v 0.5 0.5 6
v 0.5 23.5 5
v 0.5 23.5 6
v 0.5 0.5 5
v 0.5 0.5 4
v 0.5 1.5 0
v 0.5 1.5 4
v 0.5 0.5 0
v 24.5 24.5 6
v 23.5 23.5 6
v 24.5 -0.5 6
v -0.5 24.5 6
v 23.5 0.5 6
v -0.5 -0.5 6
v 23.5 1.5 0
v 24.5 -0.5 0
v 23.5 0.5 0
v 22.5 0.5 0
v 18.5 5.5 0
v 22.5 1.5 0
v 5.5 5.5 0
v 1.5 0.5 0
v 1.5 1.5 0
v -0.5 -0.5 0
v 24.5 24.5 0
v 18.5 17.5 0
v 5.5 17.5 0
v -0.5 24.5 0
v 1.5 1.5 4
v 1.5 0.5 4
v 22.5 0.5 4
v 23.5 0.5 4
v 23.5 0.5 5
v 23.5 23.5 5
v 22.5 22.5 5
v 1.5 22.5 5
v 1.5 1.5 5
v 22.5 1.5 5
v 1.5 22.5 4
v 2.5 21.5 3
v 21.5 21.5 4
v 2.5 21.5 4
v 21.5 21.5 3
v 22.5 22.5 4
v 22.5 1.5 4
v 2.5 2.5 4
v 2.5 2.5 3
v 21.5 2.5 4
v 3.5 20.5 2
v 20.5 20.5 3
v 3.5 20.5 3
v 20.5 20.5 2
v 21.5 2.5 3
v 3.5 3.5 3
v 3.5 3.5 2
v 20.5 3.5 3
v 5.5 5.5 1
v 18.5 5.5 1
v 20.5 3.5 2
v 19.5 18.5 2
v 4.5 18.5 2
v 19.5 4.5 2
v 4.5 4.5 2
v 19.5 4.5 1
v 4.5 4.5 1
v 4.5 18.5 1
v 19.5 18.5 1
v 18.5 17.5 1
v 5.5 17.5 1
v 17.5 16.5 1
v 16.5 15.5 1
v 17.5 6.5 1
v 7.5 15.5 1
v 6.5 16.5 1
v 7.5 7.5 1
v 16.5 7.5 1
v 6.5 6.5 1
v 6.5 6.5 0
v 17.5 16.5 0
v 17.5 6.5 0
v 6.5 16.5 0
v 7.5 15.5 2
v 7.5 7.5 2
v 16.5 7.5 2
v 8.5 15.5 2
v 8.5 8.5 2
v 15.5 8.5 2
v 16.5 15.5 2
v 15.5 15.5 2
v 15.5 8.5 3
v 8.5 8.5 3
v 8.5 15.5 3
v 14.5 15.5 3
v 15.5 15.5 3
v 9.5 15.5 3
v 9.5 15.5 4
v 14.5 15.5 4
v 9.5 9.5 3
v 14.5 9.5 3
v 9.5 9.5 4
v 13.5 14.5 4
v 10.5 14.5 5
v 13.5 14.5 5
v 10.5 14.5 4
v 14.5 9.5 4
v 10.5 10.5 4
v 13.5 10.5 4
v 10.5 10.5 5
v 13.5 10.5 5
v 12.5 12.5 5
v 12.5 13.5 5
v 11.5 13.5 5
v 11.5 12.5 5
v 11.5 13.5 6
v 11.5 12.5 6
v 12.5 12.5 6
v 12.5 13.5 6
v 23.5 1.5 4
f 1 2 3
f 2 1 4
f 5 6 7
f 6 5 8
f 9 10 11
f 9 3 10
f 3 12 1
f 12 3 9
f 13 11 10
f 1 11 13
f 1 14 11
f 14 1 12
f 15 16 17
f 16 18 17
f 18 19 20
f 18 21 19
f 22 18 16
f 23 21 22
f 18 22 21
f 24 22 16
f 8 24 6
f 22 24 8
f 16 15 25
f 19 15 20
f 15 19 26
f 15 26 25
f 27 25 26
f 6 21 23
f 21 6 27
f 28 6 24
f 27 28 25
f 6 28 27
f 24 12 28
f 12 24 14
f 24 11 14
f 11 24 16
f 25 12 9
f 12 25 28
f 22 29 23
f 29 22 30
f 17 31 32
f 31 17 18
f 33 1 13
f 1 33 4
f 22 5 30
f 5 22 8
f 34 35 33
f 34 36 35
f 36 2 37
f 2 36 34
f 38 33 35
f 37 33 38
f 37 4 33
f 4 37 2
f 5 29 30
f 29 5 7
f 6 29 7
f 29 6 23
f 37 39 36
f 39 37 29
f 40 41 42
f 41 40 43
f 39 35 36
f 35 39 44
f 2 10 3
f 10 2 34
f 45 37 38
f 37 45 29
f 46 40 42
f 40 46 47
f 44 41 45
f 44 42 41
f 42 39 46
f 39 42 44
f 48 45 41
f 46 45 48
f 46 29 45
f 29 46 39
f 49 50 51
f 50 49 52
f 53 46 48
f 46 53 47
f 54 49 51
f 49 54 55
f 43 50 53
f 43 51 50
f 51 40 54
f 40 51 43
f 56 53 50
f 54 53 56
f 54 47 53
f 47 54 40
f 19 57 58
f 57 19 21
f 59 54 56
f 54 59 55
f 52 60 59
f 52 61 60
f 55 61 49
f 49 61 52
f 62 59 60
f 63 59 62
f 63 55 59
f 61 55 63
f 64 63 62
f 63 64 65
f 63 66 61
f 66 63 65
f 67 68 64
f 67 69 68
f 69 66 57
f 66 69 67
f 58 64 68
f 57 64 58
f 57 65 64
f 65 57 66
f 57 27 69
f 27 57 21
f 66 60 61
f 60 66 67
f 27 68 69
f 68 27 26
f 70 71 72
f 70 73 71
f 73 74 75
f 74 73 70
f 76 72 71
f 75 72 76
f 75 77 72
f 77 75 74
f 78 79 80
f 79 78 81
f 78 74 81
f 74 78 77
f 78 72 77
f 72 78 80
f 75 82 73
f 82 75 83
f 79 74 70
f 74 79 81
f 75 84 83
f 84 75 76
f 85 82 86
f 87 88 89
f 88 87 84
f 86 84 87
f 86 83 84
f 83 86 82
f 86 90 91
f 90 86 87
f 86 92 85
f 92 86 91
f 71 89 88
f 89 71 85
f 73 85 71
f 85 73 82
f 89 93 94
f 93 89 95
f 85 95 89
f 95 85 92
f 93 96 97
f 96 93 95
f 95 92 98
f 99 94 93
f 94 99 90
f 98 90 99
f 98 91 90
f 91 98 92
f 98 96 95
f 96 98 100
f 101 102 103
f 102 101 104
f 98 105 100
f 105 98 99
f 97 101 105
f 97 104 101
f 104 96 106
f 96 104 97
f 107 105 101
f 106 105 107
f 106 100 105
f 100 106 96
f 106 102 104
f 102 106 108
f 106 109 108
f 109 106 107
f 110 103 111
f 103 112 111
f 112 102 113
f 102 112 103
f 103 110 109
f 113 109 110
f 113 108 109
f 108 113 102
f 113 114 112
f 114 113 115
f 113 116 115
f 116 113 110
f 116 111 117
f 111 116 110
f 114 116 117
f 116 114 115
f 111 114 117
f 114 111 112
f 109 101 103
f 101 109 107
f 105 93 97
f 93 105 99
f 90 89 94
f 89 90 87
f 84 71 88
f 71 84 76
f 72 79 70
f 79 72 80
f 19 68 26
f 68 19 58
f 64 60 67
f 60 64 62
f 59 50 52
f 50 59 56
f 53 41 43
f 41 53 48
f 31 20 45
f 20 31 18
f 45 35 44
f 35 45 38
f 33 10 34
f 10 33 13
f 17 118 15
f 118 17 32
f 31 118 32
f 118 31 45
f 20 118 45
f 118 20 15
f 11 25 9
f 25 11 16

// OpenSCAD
union() {
    translate([0, 0, 3.0]) cube([1, 1, 6], center=true);
    translate([0, 1, 3.0]) cube([1, 1, 6], center=true);
    translate([0, 2, 3.0]) cube([1, 1, 6], center=true);
    translate([0, 3, 3.0]) cube([1, 1, 6], center=true);
    translate([0, 4, 3.0]) cube([1, 1, 6], center=true);
    translate([0, 5, 3.0]) cube([1, 1, 6], center=true);
    translate([0, 6, 3.0]) cube([1, 1, 6], center=true);
    translate([0, 7, 3.0]) cube([1, 1, 6], center=true);
    translate([0, 8, 3.0]) cube([1, 1, 6], center=true);
    translate([0, 9, 3.0]) cube([1, 1, 6], center=true);
    translate([0, 10, 3.0]) cube([1, 1, 6], center=true);
    translate([0, 11, 3.0]) cube([1, 1, 6], center=true);
    translate([0, 12, 3.0]) cube([1, 1, 6], center=true);
    translate([0, 13, 3.0]) cube([1, 1, 6], center=true);
    translate([0, 14, 3.0]) cube([1, 1, 6], center=true);
    translate([0, 15, 3.0]) cube([1, 1, 6], center=true);
    translate([0, 16, 3.0]) cube([1, 1, 6], center=true);
    translate([0, 17, 3.0]) cube([1, 1, 6], center=true);
    translate([0, 18, 3.0]) cube([1, 1, 6], center=true);
    translate([0, 19, 3.0]) cube([1, 1, 6], center=true);
    translate([0, 20, 3.0]) cube([1, 1, 6], center=true);
    translate([0, 21, 3.0]) cube([1, 1, 6], center=true);
    translate([0, 22, 3.0]) cube([1, 1, 6], center=true);
    translate([0, 23, 3.0]) cube([1, 1, 6], center=true);
    translate([0, 24, 3.0]) cube([1, 1, 6], center=true);
    translate([1, 0, 3.0]) cube([1, 1, 6], center=true);
    translate([1, 1, 4.5]) color([1, 0, 0]) cube([1, 1, 1], center=true);
    translate([1, 2, 2.5]) cube([1, 1, 5], center=true);
    translate([1, 3, 2.5]) cube([1, 1, 5], center=true);
    translate([1, 4, 2.5]) cube([1, 1, 5], center=true);
    translate([1, 5, 2.5]) cube([1, 1, 5], center=true);
    translate([1, 6, 2.5]) cube([1, 1, 5], center=true);
    translate([1, 7, 2.5]) cube([1, 1, 5], center=true);
    translate([1, 8, 2.5]) cube([1, 1, 5], center=true);
    translate([1, 9, 2.5]) cube([1, 1, 5], center=true);
    translate([1, 10, 2.5]) cube([1, 1, 5], center=true);
    translate([1, 11, 2.5]) cube([1, 1, 5], center=true);
    translate([1, 12, 2.5]) cube([1, 1, 5], center=true);
    translate([1, 13, 2.5]) cube([1, 1, 5], center=true);
    translate([1, 14, 2.5]) cube([1, 1, 5], center=true);
    translate([1, 15, 2.5]) cube([1, 1, 5], center=true);
    translate([1, 16, 2.5]) cube([1, 1, 5], center=true);
    translate([1, 17, 2.5]) cube([1, 1, 5], center=true);
    translate([1, 18, 2.5]) cube([1, 1, 5], center=true);
    translate([1, 19, 2.5]) cube([1, 1, 5], center=true);
    translate([1, 20, 2.5]) cube([1, 1, 5], center=true);
    translate([1, 21, 2.5]) cube([1, 1, 5], center=true);
    translate([1, 22, 2.5]) cube([1, 1, 5], center=true);
    translate([1, 23, 2.5]) cube([1, 1, 5], center=true);
    translate([1, 24, 3.0]) cube([1, 1, 6], center=true);
    translate([2, 0, 3.0]) cube([1, 1, 6], center=true);
    translate([2, 1, 2.5]) cube([1, 1, 5], center=true);
    translate([2, 2, 2.0]) cube([1, 1, 4], center=true);
    translate([2, 3, 2.0]) cube([1, 1, 4], center=true);
    translate([2, 4, 2.0]) cube([1, 1, 4], center=true);
    translate([2, 5, 2.0]) cube([1, 1, 4], center=true);
    translate([2, 6, 2.0]) cube([1, 1, 4], center=true);
    translate([2, 7, 2.0]) cube([1, 1, 4], center=true);
    translate([2, 8, 2.0]) cube([1, 1, 4], center=true);
    translate([2, 9, 2.0]) cube([1, 1, 4], center=true);
    translate([2, 10, 2.0]) cube([1, 1, 4], center=true);
    translate([2, 11, 2.0]) cube([1, 1, 4], center=true);
    translate([2, 12, 2.0]) cube([1, 1, 4], center=true);
    translate([2, 13, 2.0]) cube([1, 1, 4], center=true);
    translate([2, 14, 2.0]) cube([1, 1, 4], center=true);
    translate([2, 15, 2.0]) cube([1, 1, 4], center=true);
    translate([2, 16, 2.0]) cube([1, 1, 4], center=true);
    translate([2, 17, 2.0]) cube([1, 1, 4], center=true);
    translate([2, 18, 2.0]) cube([1, 1, 4], center=true);
    translate([2, 19, 2.0]) cube([1, 1, 4], center=true);
    translate([2, 20, 2.0]) cube([1, 1, 4], center=true);
    translate([2, 21, 2.0]) cube([1, 1, 4], center=true);
    translate([2, 22, 2.0]) cube([1, 1, 4], center=true);
    translate([2, 23, 2.5]) cube([1, 1, 5], center=true);
    translate([2, 24, 3.0]) cube([1, 1, 6], center=true);
    translate([3, 0, 3.0]) cube([1, 1, 6], center=true);
    translate([3, 1, 2.5]) cube([1, 1, 5], center=true);
    translate([3, 2, 2.0]) cube([1, 1, 4], center=true);
    translate([3, 3, 1.5]) cube([1, 1, 3], center=true);
    translate([3, 4, 1.5]) cube([1, 1, 3], center=true);
    translate([3, 5, 1.5]) cube([1, 1, 3], center=true);
    translate([3, 6, 1.5]) cube([1, 1, 3], center=true);
    translate([3, 7, 1.5]) cube([1, 1, 3], center=true);
    translate([3, 8, 1.5]) cube([1, 1, 3], center=true);
    translate([3, 9, 1.5]) cube([1, 1, 3], center=true);
    translate([3, 10, 1.5]) cube([1, 1, 3], center=true);
    translate([3, 11, 1.5]) cube([1, 1, 3], center=true);
    translate([3, 12, 1.5]) cube([1, 1, 3], center=true);
    translate([3, 13, 1.5]) cube([1, 1, 3], center=true);
    translate([3, 14, 1.5]) cube([1, 1, 3], center=true);
    translate([3, 15, 1.5]) cube([1, 1, 3], center=true);
    translate([3, 16, 1.5]) cube([1, 1, 3], center=true);
    translate([3, 17, 1.5]) cube([1, 1, 3], center=true);
    translate([3, 18, 1.5]) cube([1, 1, 3], center=true);
    translate([3, 19, 1.5]) cube([1, 1, 3], center=true);
    translate([3, 20, 1.5]) cube([1, 1, 3], center=true);
    translate([3, 21, 1.5]) cube([1, 1, 3], center=true);
    translate([3, 22, 2.0]) cube([1, 1, 4], center=true);
    translate([3, 23, 2.5]) cube([1, 1, 5], center=true);
    translate([3, 24, 3.0]) cube([1, 1, 6], center=true);
    translate([4, 0, 3.0]) cube([1, 1, 6], center=true);
    translate([4, 1, 2.5]) cube([1, 1, 5], center=true);
    translate([4, 2, 2.0]) cube([1, 1, 4], center=true);
    translate([4, 3, 1.5]) cube([1, 1, 3], center=true);
    translate([4, 4, 1.0]) cube([1, 1, 2], center=true);
    translate([4, 5, 1.0]) cube([1, 1, 2], center=true);
    translate([4, 6, 1.0]) cube([1, 1, 2], center=true);
    translate([4, 7, 1.0]) cube([1, 1, 2], center=true);
    translate([4, 8, 1.0]) cube([1, 1, 2], center=true);
    translate([4, 9, 1.0]) cube([1, 1, 2], center=true);
    translate([4, 10, 1.0]) cube([1, 1, 2], center=true);
    translate([4, 11, 1.0]) cube([1, 1, 2], center=true);
    translate([4, 12, 1.0]) cube([1, 1, 2], center=true);
    translate([4, 13, 1.0]) cube([1, 1, 2], center=true);
    translate([4, 14, 1.0]) cube([1, 1, 2], center=true);
    translate([4, 15, 1.0]) cube([1, 1, 2], center=true);
    translate([4, 16, 1.0]) cube([1, 1, 2], center=true);
    translate([4, 17, 1.0]) cube([1, 1, 2], center=true);
    translate([4, 18, 1.0]) cube([1, 1, 2], center=true);
    translate([4, 19, 1.0]) cube([1, 1, 2], center=true);
    translate([4, 20, 1.0]) cube([1, 1, 2], center=true);
    translate([4, 21, 1.5]) cube([1, 1, 3], center=true);
    translate([4, 22, 2.0]) cube([1, 1, 4], center=true);
    translate([4, 23, 2.5]) cube([1, 1, 5], center=true);
    translate([4, 24, 3.0]) cube([1, 1, 6], center=true);
    translate([5, 0, 3.0]) cube([1, 1, 6], center=true);
    translate([5, 1, 2.5]) cube([1, 1, 5], center=true);
    translate([5, 2, 2.0]) cube([1, 1, 4], center=true);
    translate([5, 3, 1.5]) cube([1, 1, 3], center=true);
    translate([5, 4, 1.0]) cube([1, 1, 2], center=true);
    translate([5, 5, 0.5]) cube([1, 1, 1], center=true);
    translate([5, 6, 0.5]) cube([1, 1, 1], center=true);
    translate([5, 7, 0.5]) cube([1, 1, 1], center=true);
    translate([5, 8, 0.5]) cube([1, 1, 1], center=true);
    translate([5, 9, 0.5]) cube([1, 1, 1], center=true);
    translate([5, 10, 0.5]) cube([1, 1, 1], center=true);
    translate([5, 11, 0.5]) cube([1, 1, 1], center=true);
    translate([5, 12, 0.5]) cube([1, 1, 1], center=true);
    translate([5, 13, 0.5]) cube([1, 1, 1], center=true);
    translate([5, 14, 0.5]) cube([1, 1, 1], center=true);
    translate([5, 15, 0.5]) cube([1, 1, 1], center=true);
    translate([5, 16, 0.5]) cube([1, 1, 1], center=true);
    translate([5, 17, 0.5]) cube([1, 1, 1], center=true);
    translate([5, 18, 0.5]) cube([1, 1, 1], center=true);
    translate([5, 19, 1.0]) cube([1, 1, 2], center=true);
    translate([5, 20, 1.0]) cube([1, 1, 2], center=true);
    translate([5, 21, 1.5]) cube([1, 1, 3], center=true);
    translate([5, 22, 2.0]) cube([1, 1, 4], center=true);
    translate([5, 23, 2.5]) cube([1, 1, 5], center=true);
    translate([5, 24, 3.0]) cube([1, 1, 6], center=true);
    translate([6, 0, 3.0]) cube([1, 1, 6], center=true);
    translate([6, 1, 2.5]) cube([1, 1, 5], center=true);
    translate([6, 2, 2.0]) cube([1, 1, 4], center=true);
    translate([6, 3, 1.5]) cube([1, 1, 3], center=true);
    translate([6, 4, 1.0]) cube([1, 1, 2], center=true);
    translate([6, 5, 0.5]) cube([1, 1, 1], center=true);
    translate([6, 18, 0.5]) cube([1, 1, 1], center=true);
    translate([6, 19, 1.0]) cube([1, 1, 2], center=true);
    translate([6, 20, 1.0]) cube([1, 1, 2], center=true);
    translate([6, 21, 1.5]) cube([1, 1, 3], center=true);
    translate([6, 22, 2.0]) cube([1, 1, 4], center=true);
    translate([6, 23, 2.5]) cube([1, 1, 5], center=true);
    translate([6, 24, 3.0]) cube([1, 1, 6], center=true);
    translate([7, 0, 3.0]) cube([1, 1, 6], center=true);
    translate([7, 1, 2.5]) cube([1, 1, 5], center=true);
    translate([7, 2, 2.0]) cube([1, 1, 4], center=true);
    translate([7, 3, 1.5]) cube([1, 1, 3], center=true);
    translate([7, 4, 1.0]) cube([1, 1, 2], center=true);
    translate([7, 5, 0.5]) cube([1, 1, 1], center=true);
    translate([7, 7, 0.5]) cube([1, 1, 1], center=true);
    translate([7, 8, 0.5]) cube([1, 1, 1], center=true);
    translate([7, 9, 0.5]) cube([1, 1, 1], center=true);
    translate([7, 10, 0.5]) cube([1, 1, 1], center=true);
    translate([7, 11, 0.5]) cube([1, 1, 1], center=true);
    translate([7, 12, 0.5]) cube([1, 1, 1], center=true);
    translate([7, 13, 0.5]) cube([1, 1, 1], center=true);
    translate([7, 14, 0.5]) cube([1, 1, 1], center=true);
    translate([7, 15, 0.5]) cube([1, 1, 1], center=true);
    translate([7, 16, 0.5]) cube([1, 1, 1], center=true);
    translate([7, 18, 0.5]) cube([1, 1, 1], center=true);
    translate([7, 19, 1.0]) cube([1, 1, 2], center=true);
    translate([7, 20, 1.0]) cube([1, 1, 2], center=true);
    translate([7, 21, 1.5]) cube([1, 1, 3], center=true);
    translate([7, 22, 2.0]) cube([1, 1, 4], center=true);
    translate([7, 23, 2.5]) cube([1, 1, 5], center=true);
    translate([7, 24, 3.0]) cube([1, 1, 6], center=true);
    translate([8, 0, 3.0]) cube([1, 1, 6], center=true);
    translate([8, 1, 2.5]) cube([1, 1, 5], center=true);
    translate([8, 2, 2.0]) cube([1, 1, 4], center=true);
    translate([8, 3, 1.5]) cube([1, 1, 3], center=true);
    translate([8, 4, 1.0]) cube([1, 1, 2], center=true);
    translate([8, 5, 0.5]) cube([1, 1, 1], center=true);
    translate([8, 7, 0.5]) cube([1, 1, 1], center=true);
    translate([8, 8, 1.0]) cube([1, 1, 2], center=true);
    translate([8, 9, 1.0]) cube([1, 1, 2], center=true);
    translate([8, 10, 1.0]) cube([1, 1, 2], center=true);
    translate([8, 11, 1.0]) cube([1, 1, 2], center=true);
    translate([8, 12, 1.0]) cube([1, 1, 2], center=true);
    translate([8, 13, 1.0]) cube([1, 1, 2], center=true);
    translate([8, 14, 1.0]) cube([1, 1, 2], center=true);
    translate([8, 15, 1.0]) cube([1, 1, 2], center=true);
    translate([8, 16, 0.5]) cube([1, 1, 1], center=true);
    translate([8, 18, 0.5]) cube([1, 1, 1], center=true);
    translate([8, 19, 1.0]) cube([1, 1, 2], center=true);
    translate([8, 20, 1.0]) cube([1, 1, 2], center=true);
    translate([8, 21, 1.5]) cube([1, 1, 3], center=true);
    translate([8, 22, 2.0]) cube([1, 1, 4], center=true);
    translate([8, 23, 2.5]) cube([1, 1, 5], center=true);
    translate([8, 24, 3.0]) cube([1, 1, 6], center=true);
    translate([9, 0, 3.0]) cube([1, 1, 6], center=true);
    translate([9, 1, 2.5]) cube([1, 1, 5], center=true);
    translate([9, 2, 2.0]) cube([1, 1, 4], center=true);
    translate([9, 3, 1.5]) cube([1, 1, 3], center=true);
    translate([9, 4, 1.0]) cube([1, 1, 2], center=true);
    translate([9, 5, 0.5]) cube([1, 1, 1], center=true);
    translate([9, 7, 0.5]) cube([1, 1, 1], center=true);
    translate([9, 8, 1.0]) cube([1, 1, 2], center=true);
    translate([9, 9, 1.5]) cube([1, 1, 3], center=true);
    translate([9, 10, 1.5]) cube([1, 1, 3], center=true);
    translate([9, 11, 1.5]) cube([1, 1, 3], center=true);
    translate([9, 12, 1.5]) cube([1, 1, 3], center=true);
    translate([9, 13, 1.5]) cube([1, 1, 3], center=true);
    translate([9, 14, 1.5]) cube([1, 1, 3], center=true);
    translate([9, 15, 1.5]) cube([1, 1, 3], center=true);
    translate([9, 16, 0.5]) cube([1, 1, 1], center=true);
    translate([9, 18, 0.5]) cube([1, 1, 1], center=true);
    translate([9, 19, 1.0]) cube([1, 1, 2], center=true);
    translate([9, 20, 1.0]) cube([1, 1, 2], center=true);
    translate([9, 21, 1.5]) cube([1, 1, 3], center=true);
    translate([9, 22, 2.0]) cube([1, 1, 4], center=true);
    translate([9, 23, 2.5]) cube([1, 1, 5], center=true);
    translate([9, 24, 3.0]) cube([1, 1, 6], center=true);
    translate([10, 0, 3.0]) cube([1, 1, 6], center=true);
    translate([10, 1, 2.5]) cube([1, 1, 5], center=true);
    translate([10, 2, 2.0]) cube([1, 1, 4], center=true);
    translate([10, 3, 1.5]) cube([1, 1, 3], center=true);
    translate([10, 4, 1.0]) cube([1, 1, 2], center=true);
    translate([10, 5, 0.5]) cube([1, 1, 1], center=true);
    translate([10, 7, 0.5]) cube([1, 1, 1], center=true);
    translate([10, 8, 1.0]) cube([1, 1, 2], center=true);
    translate([10, 9, 1.5]) cube([1, 1, 3], center=true);
    translate([10, 10, 2.0]) cube([1, 1, 4], center=true);
    translate([10, 11, 2.0]) cube([1, 1, 4], center=true);
    translate([10, 12, 2.0]) cube([1, 1, 4], center=true);
    translate([10, 13, 2.0]) cube([1, 1, 4], center=true);
    translate([10, 14, 2.0]) cube([1, 1, 4], center=true);
    translate([10, 15, 2.0]) cube([1, 1, 4], center=true);
    translate([10, 16, 0.5]) cube([1, 1, 1], center=true);
    translate([10, 18, 0.5]) cube([1, 1, 1], center=true);
    translate([10, 19, 1.0]) cube([1, 1, 2], center=true);
    translate([10, 20, 1.0]) cube([1, 1, 2], center=true);
    translate([10, 21, 1.5]) cube([1, 1, 3], center=true);
    translate([10, 22, 2.0]) cube([1, 1, 4], center=true);
    translate([10, 23, 2.5]) cube([1, 1, 5], center=true);
    translate([10, 24, 3.0]) cube([1, 1, 6], center=true);
    translate([11, 0, 3.0]) cube([1, 1, 6], center=true);
    translate([11, 1, 2.5]) cube([1, 1, 5], center=true);
    translate([11, 2, 2.0]) cube([1, 1, 4], center=true);
    translate([11, 3, 1.5]) cube([1, 1, 3], center=true);
    translate([11, 4, 1.0]) cube([1, 1, 2], center=true);
    translate([11, 5, 0.5]) cube([1, 1, 1], center=true);
    translate([11, 7, 0.5]) cube([1, 1, 1], center=true);
    translate([11, 8, 1.0]) cube([1, 1, 2], center=true);
    translate([11, 9, 1.5]) cube([1, 1, 3], center=true);
    translate([11, 10, 2.0]) cube([1, 1, 4], center=true);
    translate([11, 11, 2.5]) cube([1, 1, 5], center=true);
    translate([11, 12, 2.5]) cube([1, 1, 5], center=true);
    translate([11, 13, 2.5]) cube([1, 1, 5], center=true);
    translate([11, 14, 2.5]) cube([1, 1, 5], center=true);
    translate([11, 15, 2.0]) cube([1, 1, 4], center=true);
    translate([11, 16, 0.5]) cube([1, 1, 1], center=true);
    translate([11, 18, 0.5]) cube([1, 1, 1], center=true);
    translate([11, 19, 1.0]) cube([1, 1, 2], center=true);
    translate([11, 20, 1.0]) cube([1, 1, 2], center=true);
    translate([11, 21, 1.5]) cube([1, 1, 3], center=true);
    translate([11, 22, 2.0]) cube([1, 1, 4], center=true);
    translate([11, 23, 2.5]) cube([1, 1, 5], center=true);
    translate([11, 24, 3.0]) cube([1, 1, 6], center=true);
    translate([12, 0, 3.0]) cube([1, 1, 6], center=true);
    translate([12, 1, 2.5]) cube([1, 1, 5], center=true);
    translate([12, 2, 2.0]) cube([1, 1, 4], center=true);
    translate([12, 3, 1.5]) cube([1, 1, 3], center=true);
    translate([12, 4, 1.0]) cube([1, 1, 2], center=true);
    translate([12, 5, 0.5]) cube([1, 1, 1], center=true);
    translate([12, 7, 0.5]) cube([1, 1, 1], center=true);
    translate([12, 8, 1.0]) cube([1, 1, 2], center=true);
    translate([12, 9, 1.5]) cube([1, 1, 3], center=true);
    translate([12, 10, 2.0]) cube([1, 1, 4], center=true);
    translate([12, 11, 2.5]) cube([1, 1, 5], center=true);
    translate([12, 12, 2.5]) cube([1, 1, 5], center=true);
    translate([12, 13, 3.0]) cube([1, 1, 6], center=true);
    translate([12, 14, 2.5]) cube([1, 1, 5], center=true);
    translate([12, 15, 2.0]) cube([1, 1, 4], center=true);
    translate([12, 16, 0.5]) cube([1, 1, 1], center=true);
    translate([12, 18, 0.5]) cube([1, 1, 1], center=true);
    translate([12, 19, 1.0]) cube([1, 1, 2], center=true);
    translate([12, 20, 1.0]) cube([1, 1, 2], center=true);
    translate([12, 21, 1.5]) cube([1, 1, 3], center=true);
    translate([12, 22, 2.0]) cube([1, 1, 4], center=true);
    translate([12, 23, 2.5]) cube([1, 1, 5], center=true);
    translate([12, 24, 3.0]) cube([1, 1, 6], center=true);
    translate([13, 0, 3.0]) cube([1, 1, 6], center=true);
    translate([13, 1, 2.5]) cube([1, 1, 5], center=true);
    translate([13, 2, 2.0]) cube([1, 1, 4], center=true);
    translate([13, 3, 1.5]) cube([1, 1, 3], center=true);
    translate([13, 4, 1.0]) cube([1, 1, 2], center=true);
    translate([13, 5, 0.5]) cube([1, 1, 1], center=true);
    translate([13, 7, 0.5]) cube([1, 1, 1], center=true);
    translate([13, 8, 1.0]) cube([1, 1, 2], center=true);
    translate([13, 9, 1.5]) cube([1, 1, 3], center=true);
    translate([13, 10, 2.0]) cube([1, 1, 4], center=true);
    translate([13, 11, 2.5]) cube([1, 1, 5], center=true);
    translate([13, 12, 2.5]) cube([1, 1, 5], center=true);
    translate([13, 13, 2.5]) cube([1, 1, 5], center=true);
    translate([13, 14, 2.5]) cube([1, 1, 5], center=true);
    translate([13, 15, 2.0]) cube([1, 1, 4], center=true);
    translate([13, 16, 0.5]) cube([1, 1, 1], center=true);
    translate([13, 18, 0.5]) cube([1, 1, 1], center=true);
    translate([13, 19, 1.0]) cube([1, 1, 2], center=true);
    translate([13, 20, 1.0]) cube([1, 1, 2], center=true);
    translate([13, 21, 1.5]) cube([1, 1, 3], center=true);
    translate([13, 22, 2.0]) cube([1, 1, 4], center=true);
    translate([13, 23, 2.5]) cube([1, 1, 5], center=true);
    translate([13, 24, 3.0]) cube([1, 1, 6], center=true);
    translate([14, 0, 3.0]) cube([1, 1, 6], center=true);
    translate([14, 1, 2.5]) cube([1, 1, 5], center=true);
    translate([14, 2, 2.0]) cube([1, 1, 4], center=true);
    translate([14, 3, 1.5]) cube([1, 1, 3], center=true);
    translate([14, 4, 1.0]) cube([1, 1, 2], center=true);
    translate([14, 5, 0.5]) cube([1, 1, 1], center=true);
    translate([14, 7, 0.5]) cube([1, 1, 1], center=true);
    translate([14, 8, 1.0]) cube([1, 1, 2], center=true);
    translate([14, 9, 1.5]) cube([1, 1, 3], center=true);
    translate([14, 10, 2.0]) cube([1, 1, 4], center=true);
    translate([14, 11, 2.0]) cube([1, 1, 4], center=true);
    translate([14, 12, 2.0]) cube([1, 1, 4], center=true);
    translate([14, 13, 2.0]) cube([1, 1, 4], center=true);
    translate([14, 14, 2.0]) cube([1, 1, 4], center=true);
    translate([14, 15, 2.0]) cube([1, 1, 4], center=true);
    translate([14, 16, 0.5]) cube([1, 1, 1], center=true);
    translate([14, 18, 0.5]) cube([1, 1, 1], center=true);
    translate([14, 19, 1.0]) cube([1, 1, 2], center=true);
    translate([14, 20, 1.0]) cube([1, 1, 2], center=true);
    translate([14, 21, 1.5]) cube([1, 1, 3], center=true);
    translate([14, 22, 2.0]) cube([1, 1, 4], center=true);
    translate([14, 23, 2.5]) cube([1, 1, 5], center=true);
    translate([14, 24, 3.0]) cube([1, 1, 6], center=true);
    translate([15, 0, 3.0]) cube([1, 1, 6], center=true);
    translate([15, 1, 2.5]) cube([1, 1, 5], center=true);
    translate([15, 2, 2.0]) cube([1, 1, 4], center=true);
    translate([15, 3, 1.5]) cube([1, 1, 3], center=true);
    translate([15, 4, 1.0]) cube([1, 1, 2], center=true);
    translate([15, 5, 0.5]) cube([1, 1, 1], center=true);
    translate([15, 7, 0.5]) cube([1, 1, 1], center=true);
    translate([15, 8, 1.0]) cube([1, 1, 2], center=true);
    translate([15, 9, 1.5]) cube([1, 1, 3], center=true);
    translate([15, 10, 1.5]) cube([1, 1, 3], center=true);
    translate([15, 11, 1.5]) cube([1, 1, 3], center=true);
    translate([15, 12, 1.5]) cube([1, 1, 3], center=true);
    translate([15, 13, 1.5]) cube([1, 1, 3], center=true);
    translate([15, 14, 1.5]) cube([1, 1, 3], center=true);
    translate([15, 15, 1.5]) cube([1, 1, 3], center=true);
    translate([15, 16, 0.5]) cube([1, 1, 1], center=true);
    translate([15, 18, 0.5]) cube([1, 1, 1], center=true);
    translate([15, 19, 1.0]) cube([1, 1, 2], center=true);
    translate([15, 20, 1.0]) cube([1, 1, 2], center=true);
    translate([15, 21, 1.5]) cube([1, 1, 3], center=true);
    translate([15, 22, 2.0]) cube([1, 1, 4], center=true);
    translate([15, 23, 2.5]) cube([1, 1, 5], center=true);
    translate([15, 24, 3.0]) cube([1, 1, 6], center=true);
    translate([16, 0, 3.0]) cube([1, 1, 6], center=true);
    translate([16, 1, 2.5]) cube([1, 1, 5], center=true);
    translate([16, 2, 2.0]) cube([1, 1, 4], center=true);
    translate([16, 3, 1.5]) cube([1, 1, 3], center=true);
    translate([16, 4, 1.0]) cube([1, 1, 2], center=true);
    translate([16, 5, 0.5]) cube([1, 1, 1], center=true);
    translate([16, 7, 0.5]) cube([1, 1, 1], center=true);
    translate([16, 8, 1.0]) cube([1, 1, 2], center=true);
    translate([16, 9, 1.0]) cube([1, 1, 2], center=true);
    translate([16, 10, 1.0]) cube([1, 1, 2], center=true);
    translate([16, 11, 1.0]) cube([1, 1, 2], center=true);
    translate([16, 12, 1.0]) cube([1, 1, 2], center=true);
    translate([16, 13, 1.0]) cube([1, 1, 2], center=true);
    translate([16, 14, 1.0]) cube([1, 1, 2], center=true);
    translate([16, 15, 1.0]) cube([1, 1, 2], center=true);
    translate([16, 16, 0.5]) cube([1, 1, 1], center=true);
    translate([16, 18, 0.5]) cube([1, 1, 1], center=true);
    translate([16, 19, 1.0]) cube([1, 1, 2], center=true);
    translate([16, 20, 1.0]) cube([1, 1, 2], center=true);
    translate([16, 21, 1.5]) cube([1, 1, 3], center=true);
    translate([16, 22, 2.0]) cube([1, 1, 4], center=true);
    translate([16, 23, 2.5]) cube([1, 1, 5], center=true);
    translate([16, 24, 3.0]) cube([1, 1, 6], center=true);
    translate([17, 0, 3.0]) cube([1, 1, 6], center=true);
    translate([17, 1, 2.5]) cube([1, 1, 5], center=true);
    translate([17, 2, 2.0]) cube([1, 1, 4], center=true);
    translate([17, 3, 1.5]) cube([1, 1, 3], center=true);
    translate([17, 4, 1.0]) cube([1, 1, 2], center=true);
    translate([17, 5, 0.5]) cube([1, 1, 1], center=true);
    translate([17, 7, 0.5]) cube([1, 1, 1], center=true);
    translate([17, 8, 0.5]) cube([1, 1, 1], center=true);
    translate([17, 9, 0.5]) cube([1, 1, 1], center=true);
    translate([17, 10, 0.5]) cube([1, 1, 1], center=true);
    translate([17, 11, 0.5]) cube([1, 1, 1], center=true);
    translate([17, 12, 0.5]) cube([1, 1, 1], center=true);
    translate([17, 13, 0.5]) cube([1, 1, 1], center=true);
    translate([17, 14, 0.5]) cube([1, 1, 1], center=true);
    translate([17, 15, 0.5]) cube([1, 1, 1], center=true);
    translate([17, 16, 0.5]) cube([1, 1, 1], center=true);
    translate([17, 18, 0.5]) cube([1, 1, 1], center=true);
    translate([17, 19, 1.0]) cube([1, 1, 2], center=true);
    translate([17, 20, 1.0]) cube([1, 1, 2], center=true);
    translate([17, 21, 1.5]) cube([1, 1, 3], center=true);
    translate([17, 22, 2.0]) cube([1, 1, 4], center=true);
    translate([17, 23, 2.5]) cube([1, 1, 5], center=true);
    translate([17, 24, 3.0]) cube([1, 1, 6], center=true);
    translate([18, 0, 3.0]) cube([1, 1, 6], center=true);
    translate([18, 1, 2.5]) cube([1, 1, 5], center=true);
    translate([18, 2, 2.0]) cube([1, 1, 4], center=true);
    translate([18, 3, 1.5]) cube([1, 1, 3], center=true);
    translate([18, 4, 1.0]) cube([1, 1, 2], center=true);
    translate([18, 5, 0.5]) cube([1, 1, 1], center=true);
    translate([18, 18, 0.5]) cube([1, 1, 1], center=true);
    translate([18, 19, 1.0]) cube([1, 1, 2], center=true);
    translate([18, 20, 1.0]) cube([1, 1, 2], center=true);
    translate([18, 21, 1.5]) cube([1, 1, 3], center=true);
    translate([18, 22, 2.0]) cube([1, 1, 4], center=true);
    translate([18, 23, 2.5]) cube([1, 1, 5], center=true);
    translate([18, 24, 3.0]) cube([1, 1, 6], center=true);
    translate([19, 0, 3.0]) cube([1, 1, 6], center=true);
    translate([19, 1, 2.5]) cube([1, 1, 5], center=true);
    translate([19, 2, 2.0]) cube([1, 1, 4], center=true);
    translate([19, 3, 1.5]) cube([1, 1, 3], center=true);
    translate([19, 4, 1.0]) cube([1, 1, 2], center=true);
    translate([19, 5, 0.5]) cube([1, 1, 1], center=true);
    translate([19, 6, 0.5]) cube([1, 1, 1], center=true);
    translate([19, 7, 0.5]) cube([1, 1, 1], center=true);
    translate([19, 8, 0.5]) cube([1, 1, 1], center=true);
    translate([19, 9, 0.5]) cube([1, 1, 1], center=true);
    translate([19, 10, 0.5]) cube([1, 1, 1], center=true);
    translate([19, 11, 0.5]) cube([1, 1, 1], center=true);
    translate([19, 12, 0.5]) cube([1, 1, 1], center=true);
    translate([19, 13, 0.5]) cube([1, 1, 1], center=true);
    translate([19, 14, 0.5]) cube([1, 1, 1], center=true);
    translate([19, 15, 0.5]) cube([1, 1, 1], center=true);
    translate([19, 16, 0.5]) cube([1, 1, 1], center=true);
    translate([19, 17, 0.5]) cube([1, 1, 1], center=true);
    translate([19, 18, 0.5]) cube([1, 1, 1], center=true);
    translate([19, 19, 1.0]) cube([1, 1, 2], center=true);
    translate([19, 20, 1.0]) cube([1, 1, 2], center=true);
    translate([19, 21, 1.5]) cube([1, 1, 3], center=true);
    translate([19, 22, 2.0]) cube([1, 1, 4], center=true);
    translate([19, 23, 2.5]) cube([1, 1, 5], center=true);
    translate([19, 24, 3.0]) cube([1, 1, 6], center=true);
    translate([20, 0, 3.0]) cube([1, 1, 6], center=true);
    translate([20, 1, 2.5]) cube([1, 1, 5], center=true);
    translate([20, 2, 2.0]) cube([1, 1, 4], center=true);
    translate([20, 3, 1.5]) cube([1, 1, 3], center=true);
    translate([20, 4, 1.0]) cube([1, 1, 2], center=true);
    translate([20, 5, 1.0]) cube([1, 1, 2], center=true);
    translate([20, 6, 1.0]) cube([1, 1, 2], center=true);
    translate([20, 7, 1.0]) cube([1, 1, 2], center=true);
    translate([20, 8, 1.0]) cube([1, 1, 2], center=true);
    translate([20, 9, 1.0]) cube([1, 1, 2], center=true);
    translate([20, 10, 1.0]) cube([1, 1, 2], center=true);
    translate([20, 11, 1.0]) cube([1, 1, 2], center=true);
    translate([20, 12, 1.0]) cube([1, 1, 2], center=true);
    translate([20, 13, 1.0]) cube([1, 1, 2], center=true);
    translate([20, 14, 1.0]) cube([1, 1, 2], center=true);
    translate([20, 15, 1.0]) cube([1, 1, 2], center=true);
    translate([20, 16, 1.0]) cube([1, 1, 2], center=true);
    translate([20, 17, 1.0]) cube([1, 1, 2], center=true);
    translate([20, 18, 1.0]) cube([1, 1, 2], center=true);
    translate([20, 19, 1.0]) cube([1, 1, 2], center=true);
    translate([20, 20, 1.0]) cube([1, 1, 2], center=true);
    translate([20, 21, 1.5]) cube([1, 1, 3], center=true);
    translate([20, 22, 2.0]) cube([1, 1, 4], center=true);
    translate([20, 23, 2.5]) cube([1, 1, 5], center=true);
    translate([20, 24, 3.0]) cube([1, 1, 6], center=true);
    translate([21, 0, 3.0]) cube([1, 1, 6], center=true);
    translate([21, 1, 2.5]) cube([1, 1, 5], center=true);
    translate([21, 2, 2.0]) cube([1, 1, 4], center=true);
    translate([21, 3, 1.5]) cube([1, 1, 3], center=true);
    translate([21, 4, 1.5]) cube([1, 1, 3], center=true);
    translate([21, 5, 1.5]) cube([1, 1, 3], center=true);
    translate([21, 6, 1.5]) cube([1, 1, 3], center=true);
    translate([21, 7, 1.5]) cube([1, 1, 3], center=true);
    translate([21, 8, 1.5]) cube([1, 1, 3], center=true);
    translate([21, 9, 1.5]) cube([1, 1, 3], center=true);
    translate([21, 10, 1.5]) cube([1, 1, 3], center=true);
    translate([21, 11, 1.5]) cube([1, 1, 3], center=true);
    translate([21, 12, 1.5]) cube([1, 1, 3], center=true);
    translate([21, 13, 1.5]) cube([1, 1, 3], center=true);
    translate([21, 14, 1.5]) cube([1, 1, 3], center=true);
    translate([21, 15, 1.5]) cube([1, 1, 3], center=true);
    translate([21, 16, 1.5]) cube([1, 1, 3], center=true);
    translate([21, 17, 1.5]) cube([1, 1, 3], center=true);
    translate([21, 18, 1.5]) cube([1, 1, 3], center=true);
    translate([21, 19, 1.5]) cube([1, 1, 3], center=true);
    translate([21, 20, 1.5]) cube([1, 1, 3], center=true);
    translate([21, 21, 1.5]) cube([1, 1, 3], center=true);
    translate([21, 22, 2.0]) cube([1, 1, 4], center=true);
    translate([21, 23, 2.5]) cube([1, 1, 5], center=true);
    translate([21, 24, 3.0]) cube([1, 1, 6], center=true);
    translate([22, 0, 3.0]) cube([1, 1, 6], center=true);
    translate([22, 1, 2.5]) cube([1, 1, 5], center=true);
    translate([22, 2, 2.0]) cube([1, 1, 4], center=true);
    translate([22, 3, 2.0]) cube([1, 1, 4], center=true);
    translate([22, 4, 2.0]) cube([1, 1, 4], center=true);
    translate([22, 5, 2.0]) cube([1, 1, 4], center=true);
    translate([22, 6, 2.0]) cube([1, 1, 4], center=true);
    translate([22, 7, 2.0]) cube([1, 1, 4], center=true);
    translate([22, 8, 2.0]) cube([1, 1, 4], center=true);
    translate([22, 9, 2.0]) cube([1, 1, 4], center=true);
    translate([22, 10, 2.0]) cube([1, 1, 4], center=true);
    translate([22, 11, 2.0]) cube([1, 1, 4], center=true);
    translate([22, 12, 2.0]) cube([1, 1, 4], center=true);
    translate([22, 13, 2.0]) cube([1, 1, 4], center=true);
    translate([22, 14, 2.0]) cube([1, 1, 4], center=true);
    translate([22, 15, 2.0]) cube([1, 1, 4], center=true);
    translate([22, 16, 2.0]) cube([1, 1, 4], center=true);
    translate([22, 17, 2.0]) cube([1, 1, 4], center=true);
    translate([22, 18, 2.0]) cube([1, 1, 4], center=true);
    translate([22, 19, 2.0]) cube([1, 1, 4], center=true);
    translate([22, 20, 2.0]) cube([1, 1, 4], center=true);
    translate([22, 21, 2.0]) cube([1, 1, 4], center=true);
    translate([22, 22, 2.0]) cube([1, 1, 4], center=true);
    translate([22, 23, 2.5]) cube([1, 1, 5], center=true);
    translate([22, 24, 3.0]) cube([1, 1, 6], center=true);
    translate([23, 0, 3.0]) cube([1, 1, 6], center=true);
    translate([23, 1, 4.5]) color([0, 0, 1]) cube([1, 1, 1], center=true);
    translate([23, 2, 2.5]) cube([1, 1, 5], center=true);
    translate([23, 3, 2.5]) cube([1, 1, 5], center=true);
    translate([23, 4, 2.5]) cube([1, 1, 5], center=true);
    translate([23, 5, 2.5]) cube([1, 1, 5], center=true);
    translate([23, 6, 2.5]) cube([1, 1, 5], center=true);
    translate([23, 7, 2.5]) cube([1, 1, 5], center=true);
    translate([23, 8, 2.5]) cube([1, 1, 5], center=true);
    translate([23, 9, 2.5]) cube([1, 1, 5], center=true);
    translate([23, 10, 2.5]) cube([1, 1, 5], center=true);
    translate([23, 11, 2.5]) cube([1, 1, 5], center=true);
    translate([23, 12, 2.5]) cube([1, 1, 5], center=true);
    translate([23, 13, 2.5]) cube([1, 1, 5], center=true);
    translate([23, 14, 2.5]) cube([1, 1, 5], center=true);
    translate([23, 15, 2.5]) cube([1, 1, 5], center=true);
    translate([23, 16, 2.5]) cube([1, 1, 5], center=true);
    translate([23, 17, 2.5]) cube([1, 1, 5], center=true);
    translate([23, 18, 2.5]) cube([1, 1, 5], center=true);
    translate([23, 19, 2.5]) cube([1, 1, 5], center=true);
    translate([23, 20, 2.5]) cube([1, 1, 5], center=true);
    translate([23, 21, 2.5]) cube([1, 1, 5], center=true);
    translate([23, 22, 2.5]) cube([1, 1, 5], center=true);
    translate([23, 23, 2.5]) cube([1, 1, 5], center=true);
    translate([23, 24, 3.0]) cube([1, 1, 6], center=true);
    translate([24, 0, 3.0]) cube([1, 1, 6], center=true);
    translate([24, 1, 3.0]) cube([1, 1, 6], center=true);
    translate([24, 2, 3.0]) cube([1, 1, 6], center=true);
    translate([24, 3, 3.0]) cube([1, 1, 6], center=true);
    translate([24, 4, 3.0]) cube([1, 1, 6], center=true);
    translate([24, 5, 3.0]) cube([1, 1, 6], center=true);
    translate([24, 6, 3.0]) cube([1, 1, 6], center=true);
    translate([24, 7, 3.0]) cube([1, 1, 6], center=true);
    translate([24, 8, 3.0]) cube([1, 1, 6], center=true);
    translate([24, 9, 3.0]) cube([1, 1, 6], center=true);
    translate([24, 10, 3.0]) cube([1, 1, 6], center=true);
    translate([24, 11, 3.0]) cube([1, 1, 6], center=true);
    translate([24, 12, 3.0]) cube([1, 1, 6], center=true);
    translate([24, 13, 3.0]) cube([1, 1, 6], center=true);
    translate([24, 14, 3.0]) cube([1, 1, 6], center=true);
    translate([24, 15, 3.0]) cube([1, 1, 6], center=true);
    translate([24, 16, 3.0]) cube([1, 1, 6], center=true);
    translate([24, 17, 3.0]) cube([1, 1, 6], center=true);
    translate([24, 18, 3.0]) cube([1, 1, 6], center=true);
    translate([24, 19, 3.0]) cube([1, 1, 6], center=true);
    translate([24, 20, 3.0]) cube([1, 1, 6], center=true);
    translate([24, 21, 3.0]) cube([1, 1, 6], center=true);
    translate([24, 22, 3.0]) cube([1, 1, 6], center=true);
    translate([24, 23, 3.0]) cube([1, 1, 6], center=true);
    translate([24, 24, 3.0]) cube([1, 1, 6], center=true);
}
